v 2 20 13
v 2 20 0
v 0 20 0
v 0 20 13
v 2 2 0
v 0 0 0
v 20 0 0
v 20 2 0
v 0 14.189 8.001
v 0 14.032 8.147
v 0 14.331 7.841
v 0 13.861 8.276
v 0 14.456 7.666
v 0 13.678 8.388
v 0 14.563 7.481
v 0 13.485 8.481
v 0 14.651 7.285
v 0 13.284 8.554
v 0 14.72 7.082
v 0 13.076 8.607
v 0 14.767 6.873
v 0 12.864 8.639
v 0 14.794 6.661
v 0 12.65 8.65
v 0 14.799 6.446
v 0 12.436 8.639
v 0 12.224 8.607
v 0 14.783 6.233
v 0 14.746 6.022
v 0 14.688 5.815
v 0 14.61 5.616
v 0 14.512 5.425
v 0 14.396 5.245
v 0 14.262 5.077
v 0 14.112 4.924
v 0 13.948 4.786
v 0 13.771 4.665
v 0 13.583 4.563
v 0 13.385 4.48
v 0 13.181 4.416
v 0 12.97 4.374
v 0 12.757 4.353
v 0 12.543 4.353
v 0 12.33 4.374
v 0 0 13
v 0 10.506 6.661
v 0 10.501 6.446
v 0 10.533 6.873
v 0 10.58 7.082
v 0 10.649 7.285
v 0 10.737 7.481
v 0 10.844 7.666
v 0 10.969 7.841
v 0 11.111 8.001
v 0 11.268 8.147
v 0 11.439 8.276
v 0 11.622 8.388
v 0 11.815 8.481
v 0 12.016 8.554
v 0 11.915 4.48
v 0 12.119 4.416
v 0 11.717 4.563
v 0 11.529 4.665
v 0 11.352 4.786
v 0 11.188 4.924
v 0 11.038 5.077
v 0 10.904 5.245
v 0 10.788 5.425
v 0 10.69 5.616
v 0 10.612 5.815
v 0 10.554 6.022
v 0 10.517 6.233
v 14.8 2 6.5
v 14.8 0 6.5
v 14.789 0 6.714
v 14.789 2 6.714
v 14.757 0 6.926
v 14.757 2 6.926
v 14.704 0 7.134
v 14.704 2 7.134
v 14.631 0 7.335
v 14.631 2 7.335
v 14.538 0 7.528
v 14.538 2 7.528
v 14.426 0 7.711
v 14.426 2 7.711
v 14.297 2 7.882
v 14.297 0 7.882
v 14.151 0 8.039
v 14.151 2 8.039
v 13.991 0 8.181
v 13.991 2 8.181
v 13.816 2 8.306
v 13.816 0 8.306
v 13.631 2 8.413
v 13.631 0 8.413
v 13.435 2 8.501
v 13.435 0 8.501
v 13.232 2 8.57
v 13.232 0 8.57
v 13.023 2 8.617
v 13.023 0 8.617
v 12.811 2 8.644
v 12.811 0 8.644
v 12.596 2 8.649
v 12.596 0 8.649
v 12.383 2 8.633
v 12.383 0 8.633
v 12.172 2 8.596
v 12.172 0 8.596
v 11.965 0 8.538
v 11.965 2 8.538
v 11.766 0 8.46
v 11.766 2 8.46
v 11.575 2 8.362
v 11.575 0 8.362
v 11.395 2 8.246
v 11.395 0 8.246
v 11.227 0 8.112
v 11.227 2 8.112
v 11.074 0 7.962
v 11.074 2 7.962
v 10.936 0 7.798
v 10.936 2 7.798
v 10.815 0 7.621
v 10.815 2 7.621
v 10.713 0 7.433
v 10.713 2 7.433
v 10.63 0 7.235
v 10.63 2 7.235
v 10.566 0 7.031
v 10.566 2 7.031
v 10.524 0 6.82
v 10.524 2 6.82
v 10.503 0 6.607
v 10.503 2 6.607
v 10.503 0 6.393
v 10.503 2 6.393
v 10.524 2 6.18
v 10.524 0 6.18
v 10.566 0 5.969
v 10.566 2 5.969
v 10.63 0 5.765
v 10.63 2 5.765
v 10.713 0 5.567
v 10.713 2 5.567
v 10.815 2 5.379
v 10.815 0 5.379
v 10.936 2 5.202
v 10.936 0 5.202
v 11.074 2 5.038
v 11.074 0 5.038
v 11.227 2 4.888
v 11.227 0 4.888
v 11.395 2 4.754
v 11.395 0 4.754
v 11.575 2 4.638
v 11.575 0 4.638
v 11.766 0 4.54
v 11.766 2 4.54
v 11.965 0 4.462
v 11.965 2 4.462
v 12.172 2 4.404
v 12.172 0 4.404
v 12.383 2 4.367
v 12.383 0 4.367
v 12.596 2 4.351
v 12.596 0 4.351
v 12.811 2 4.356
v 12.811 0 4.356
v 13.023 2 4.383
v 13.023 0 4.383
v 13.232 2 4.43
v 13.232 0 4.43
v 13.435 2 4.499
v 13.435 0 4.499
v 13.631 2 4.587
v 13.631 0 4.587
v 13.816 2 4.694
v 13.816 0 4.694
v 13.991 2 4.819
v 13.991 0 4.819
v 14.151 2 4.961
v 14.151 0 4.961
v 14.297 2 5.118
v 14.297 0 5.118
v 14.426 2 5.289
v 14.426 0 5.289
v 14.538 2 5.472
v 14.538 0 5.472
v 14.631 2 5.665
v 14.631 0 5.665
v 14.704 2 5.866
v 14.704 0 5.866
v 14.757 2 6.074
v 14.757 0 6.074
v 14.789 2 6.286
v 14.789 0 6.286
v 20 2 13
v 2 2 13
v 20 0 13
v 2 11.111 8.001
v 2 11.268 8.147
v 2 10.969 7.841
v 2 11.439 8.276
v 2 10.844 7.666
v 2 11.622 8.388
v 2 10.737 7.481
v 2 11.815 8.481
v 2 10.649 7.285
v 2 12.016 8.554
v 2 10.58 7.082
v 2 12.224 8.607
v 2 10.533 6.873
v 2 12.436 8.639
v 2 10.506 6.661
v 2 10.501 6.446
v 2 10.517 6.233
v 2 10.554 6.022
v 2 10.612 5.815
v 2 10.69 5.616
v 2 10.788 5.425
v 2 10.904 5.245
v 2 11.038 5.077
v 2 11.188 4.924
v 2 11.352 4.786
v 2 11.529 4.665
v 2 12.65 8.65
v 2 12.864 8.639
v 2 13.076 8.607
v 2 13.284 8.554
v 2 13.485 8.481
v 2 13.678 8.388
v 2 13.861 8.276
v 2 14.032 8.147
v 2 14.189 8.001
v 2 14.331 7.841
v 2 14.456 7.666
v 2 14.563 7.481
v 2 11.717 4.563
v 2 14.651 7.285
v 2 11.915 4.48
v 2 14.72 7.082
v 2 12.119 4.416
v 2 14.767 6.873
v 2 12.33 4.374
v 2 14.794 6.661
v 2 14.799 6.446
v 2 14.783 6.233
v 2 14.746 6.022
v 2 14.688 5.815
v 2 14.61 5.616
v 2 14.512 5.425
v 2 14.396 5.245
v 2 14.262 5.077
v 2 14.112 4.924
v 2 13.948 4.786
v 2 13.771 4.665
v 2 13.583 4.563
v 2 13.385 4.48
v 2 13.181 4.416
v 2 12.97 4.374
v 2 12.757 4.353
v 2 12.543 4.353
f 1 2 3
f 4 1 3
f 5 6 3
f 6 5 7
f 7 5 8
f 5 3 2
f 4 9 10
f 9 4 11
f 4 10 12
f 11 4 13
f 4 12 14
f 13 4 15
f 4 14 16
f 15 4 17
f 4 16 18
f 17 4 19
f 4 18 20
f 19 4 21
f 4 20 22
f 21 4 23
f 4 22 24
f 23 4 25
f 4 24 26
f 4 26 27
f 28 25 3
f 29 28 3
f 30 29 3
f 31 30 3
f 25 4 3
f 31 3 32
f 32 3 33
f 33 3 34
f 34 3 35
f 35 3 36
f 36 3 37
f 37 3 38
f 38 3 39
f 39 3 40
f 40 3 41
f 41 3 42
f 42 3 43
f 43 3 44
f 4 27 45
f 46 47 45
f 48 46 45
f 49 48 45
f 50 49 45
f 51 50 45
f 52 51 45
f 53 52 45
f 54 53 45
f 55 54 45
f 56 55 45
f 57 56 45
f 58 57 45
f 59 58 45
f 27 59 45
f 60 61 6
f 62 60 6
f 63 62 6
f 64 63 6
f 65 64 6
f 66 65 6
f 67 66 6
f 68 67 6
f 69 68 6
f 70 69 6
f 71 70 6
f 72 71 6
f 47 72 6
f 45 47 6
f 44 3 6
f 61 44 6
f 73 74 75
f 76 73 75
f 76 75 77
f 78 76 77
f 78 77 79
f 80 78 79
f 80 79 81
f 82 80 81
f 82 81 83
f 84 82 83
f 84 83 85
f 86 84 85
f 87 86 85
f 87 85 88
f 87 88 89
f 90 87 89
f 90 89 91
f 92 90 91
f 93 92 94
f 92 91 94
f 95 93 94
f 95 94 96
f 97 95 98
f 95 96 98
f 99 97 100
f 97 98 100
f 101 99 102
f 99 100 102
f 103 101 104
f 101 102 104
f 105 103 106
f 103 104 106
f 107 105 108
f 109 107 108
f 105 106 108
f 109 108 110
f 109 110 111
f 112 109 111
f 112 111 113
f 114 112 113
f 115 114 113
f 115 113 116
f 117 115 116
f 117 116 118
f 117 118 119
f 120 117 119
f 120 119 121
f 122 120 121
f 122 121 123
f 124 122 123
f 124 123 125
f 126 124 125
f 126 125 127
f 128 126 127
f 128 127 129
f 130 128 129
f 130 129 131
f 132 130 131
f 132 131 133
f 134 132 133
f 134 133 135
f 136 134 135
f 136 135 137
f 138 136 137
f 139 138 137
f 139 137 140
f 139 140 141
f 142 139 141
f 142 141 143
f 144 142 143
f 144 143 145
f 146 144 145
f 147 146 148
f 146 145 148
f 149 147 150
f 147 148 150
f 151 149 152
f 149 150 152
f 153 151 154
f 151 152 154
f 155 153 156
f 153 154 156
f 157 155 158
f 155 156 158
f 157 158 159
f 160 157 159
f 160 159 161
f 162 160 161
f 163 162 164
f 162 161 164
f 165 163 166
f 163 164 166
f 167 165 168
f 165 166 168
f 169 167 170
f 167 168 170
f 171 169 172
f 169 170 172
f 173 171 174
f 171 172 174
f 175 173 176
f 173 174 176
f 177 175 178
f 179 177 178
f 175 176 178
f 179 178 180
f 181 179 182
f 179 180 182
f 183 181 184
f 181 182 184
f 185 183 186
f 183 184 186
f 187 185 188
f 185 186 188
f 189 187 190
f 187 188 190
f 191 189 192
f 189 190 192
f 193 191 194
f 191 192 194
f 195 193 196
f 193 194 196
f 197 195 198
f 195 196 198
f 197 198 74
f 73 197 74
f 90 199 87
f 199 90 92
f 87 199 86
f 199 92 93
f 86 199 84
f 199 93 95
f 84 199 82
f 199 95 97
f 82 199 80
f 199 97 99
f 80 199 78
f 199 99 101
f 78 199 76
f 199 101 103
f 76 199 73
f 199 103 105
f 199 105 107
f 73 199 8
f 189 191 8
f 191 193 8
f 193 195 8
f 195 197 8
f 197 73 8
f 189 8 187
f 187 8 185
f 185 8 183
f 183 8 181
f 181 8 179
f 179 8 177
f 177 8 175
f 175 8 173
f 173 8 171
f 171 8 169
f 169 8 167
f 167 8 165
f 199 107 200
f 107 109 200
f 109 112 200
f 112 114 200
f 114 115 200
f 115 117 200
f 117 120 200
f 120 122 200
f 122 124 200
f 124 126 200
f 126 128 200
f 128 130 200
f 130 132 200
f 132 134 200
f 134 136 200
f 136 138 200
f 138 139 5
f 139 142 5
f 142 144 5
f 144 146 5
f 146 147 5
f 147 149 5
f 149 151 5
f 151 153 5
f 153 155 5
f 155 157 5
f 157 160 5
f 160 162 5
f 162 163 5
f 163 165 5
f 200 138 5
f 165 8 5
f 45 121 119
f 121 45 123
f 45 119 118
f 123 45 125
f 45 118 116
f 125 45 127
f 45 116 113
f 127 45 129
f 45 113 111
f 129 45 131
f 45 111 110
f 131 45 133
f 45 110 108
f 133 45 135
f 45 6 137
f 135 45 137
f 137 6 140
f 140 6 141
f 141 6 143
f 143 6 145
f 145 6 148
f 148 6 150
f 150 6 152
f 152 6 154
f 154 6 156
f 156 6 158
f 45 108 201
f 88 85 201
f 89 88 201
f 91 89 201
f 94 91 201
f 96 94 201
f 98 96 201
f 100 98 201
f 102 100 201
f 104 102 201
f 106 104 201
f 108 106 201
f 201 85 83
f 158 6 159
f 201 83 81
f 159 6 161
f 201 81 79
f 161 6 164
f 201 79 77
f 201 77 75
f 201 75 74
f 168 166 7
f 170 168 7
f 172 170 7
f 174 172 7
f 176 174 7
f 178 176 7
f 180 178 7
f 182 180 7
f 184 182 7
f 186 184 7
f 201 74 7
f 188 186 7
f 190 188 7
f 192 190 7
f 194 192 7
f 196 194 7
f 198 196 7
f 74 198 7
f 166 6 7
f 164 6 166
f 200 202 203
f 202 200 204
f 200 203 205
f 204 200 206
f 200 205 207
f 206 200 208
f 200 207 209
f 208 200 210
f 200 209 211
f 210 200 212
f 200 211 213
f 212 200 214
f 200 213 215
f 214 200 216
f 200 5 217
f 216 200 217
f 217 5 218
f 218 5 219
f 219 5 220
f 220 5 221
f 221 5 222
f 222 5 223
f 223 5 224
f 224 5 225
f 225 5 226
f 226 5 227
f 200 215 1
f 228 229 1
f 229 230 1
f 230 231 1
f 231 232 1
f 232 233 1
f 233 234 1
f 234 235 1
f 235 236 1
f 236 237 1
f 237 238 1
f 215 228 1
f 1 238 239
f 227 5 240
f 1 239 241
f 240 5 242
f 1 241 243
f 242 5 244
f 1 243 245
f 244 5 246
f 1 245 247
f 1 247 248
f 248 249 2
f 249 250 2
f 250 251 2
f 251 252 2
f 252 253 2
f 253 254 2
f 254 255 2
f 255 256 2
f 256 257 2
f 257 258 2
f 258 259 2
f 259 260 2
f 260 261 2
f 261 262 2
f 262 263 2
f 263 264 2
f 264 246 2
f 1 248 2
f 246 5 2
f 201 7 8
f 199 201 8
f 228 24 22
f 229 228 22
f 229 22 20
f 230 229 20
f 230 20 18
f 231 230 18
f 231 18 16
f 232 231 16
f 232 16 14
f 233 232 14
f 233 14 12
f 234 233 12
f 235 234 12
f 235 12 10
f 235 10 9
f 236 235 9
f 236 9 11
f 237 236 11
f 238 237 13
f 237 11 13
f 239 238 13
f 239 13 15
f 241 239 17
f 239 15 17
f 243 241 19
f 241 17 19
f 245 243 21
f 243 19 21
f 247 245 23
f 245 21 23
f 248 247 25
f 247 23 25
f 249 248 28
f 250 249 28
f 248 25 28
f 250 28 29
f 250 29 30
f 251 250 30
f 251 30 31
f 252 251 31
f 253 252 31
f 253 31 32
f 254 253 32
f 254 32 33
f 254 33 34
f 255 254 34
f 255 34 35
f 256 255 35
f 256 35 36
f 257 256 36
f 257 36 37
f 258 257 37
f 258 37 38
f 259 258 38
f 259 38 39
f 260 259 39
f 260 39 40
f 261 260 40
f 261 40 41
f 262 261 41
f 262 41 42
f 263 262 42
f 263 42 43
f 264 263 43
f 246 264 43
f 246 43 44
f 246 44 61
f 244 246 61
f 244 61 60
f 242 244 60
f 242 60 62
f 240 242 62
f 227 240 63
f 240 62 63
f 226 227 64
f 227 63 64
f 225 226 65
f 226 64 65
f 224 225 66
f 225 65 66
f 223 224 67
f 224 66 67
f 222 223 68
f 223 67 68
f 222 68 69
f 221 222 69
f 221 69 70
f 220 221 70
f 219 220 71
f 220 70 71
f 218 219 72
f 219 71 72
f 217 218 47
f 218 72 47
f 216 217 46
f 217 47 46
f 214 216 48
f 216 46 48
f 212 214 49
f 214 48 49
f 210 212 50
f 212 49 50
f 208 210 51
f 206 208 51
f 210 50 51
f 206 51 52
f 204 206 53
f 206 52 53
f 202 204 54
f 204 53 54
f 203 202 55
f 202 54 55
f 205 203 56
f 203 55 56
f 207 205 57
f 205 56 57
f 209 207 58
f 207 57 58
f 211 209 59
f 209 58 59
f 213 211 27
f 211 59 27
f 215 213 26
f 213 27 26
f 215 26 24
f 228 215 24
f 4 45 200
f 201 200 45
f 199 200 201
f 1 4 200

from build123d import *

# Parameters (mm, degrees)
BOSS_EXTRUDE1_DEPTH = 13
SKETCH2_R           = 2.15
CUT_EXTRUDE1_DEPTH  = 21
SKETCH3_R           = 2.15
CUT_EXTRUDE2_DEPTH  = 21


with BuildPart() as part:
    # Sketch1 → Boss-Extrude1 (new body)
    with BuildSketch(Plane.XY):
        Polygon((0, 20), (0, 0), (20, 0), (20, 2), (2, 2), (2, 20), align=None)
    extrude(amount=BOSS_EXTRUDE1_DEPTH)

    # Sketch2 → Cut-Extrude1 (cut, through all)
    with BuildSketch(Plane.ZY):
        with Locations((6.5, 12.65)):
            Circle(SKETCH2_R)
    extrude(amount=-CUT_EXTRUDE1_DEPTH, mode=Mode.SUBTRACT)

    # Sketch3 → Cut-Extrude2 (cut, through all)
    with BuildSketch(Plane.XZ):
        with Locations((12.65, 6.5)):
            Circle(SKETCH3_R)
    extrude(amount=-CUT_EXTRUDE2_DEPTH, mode=Mode.SUBTRACT)


solid = part.part
